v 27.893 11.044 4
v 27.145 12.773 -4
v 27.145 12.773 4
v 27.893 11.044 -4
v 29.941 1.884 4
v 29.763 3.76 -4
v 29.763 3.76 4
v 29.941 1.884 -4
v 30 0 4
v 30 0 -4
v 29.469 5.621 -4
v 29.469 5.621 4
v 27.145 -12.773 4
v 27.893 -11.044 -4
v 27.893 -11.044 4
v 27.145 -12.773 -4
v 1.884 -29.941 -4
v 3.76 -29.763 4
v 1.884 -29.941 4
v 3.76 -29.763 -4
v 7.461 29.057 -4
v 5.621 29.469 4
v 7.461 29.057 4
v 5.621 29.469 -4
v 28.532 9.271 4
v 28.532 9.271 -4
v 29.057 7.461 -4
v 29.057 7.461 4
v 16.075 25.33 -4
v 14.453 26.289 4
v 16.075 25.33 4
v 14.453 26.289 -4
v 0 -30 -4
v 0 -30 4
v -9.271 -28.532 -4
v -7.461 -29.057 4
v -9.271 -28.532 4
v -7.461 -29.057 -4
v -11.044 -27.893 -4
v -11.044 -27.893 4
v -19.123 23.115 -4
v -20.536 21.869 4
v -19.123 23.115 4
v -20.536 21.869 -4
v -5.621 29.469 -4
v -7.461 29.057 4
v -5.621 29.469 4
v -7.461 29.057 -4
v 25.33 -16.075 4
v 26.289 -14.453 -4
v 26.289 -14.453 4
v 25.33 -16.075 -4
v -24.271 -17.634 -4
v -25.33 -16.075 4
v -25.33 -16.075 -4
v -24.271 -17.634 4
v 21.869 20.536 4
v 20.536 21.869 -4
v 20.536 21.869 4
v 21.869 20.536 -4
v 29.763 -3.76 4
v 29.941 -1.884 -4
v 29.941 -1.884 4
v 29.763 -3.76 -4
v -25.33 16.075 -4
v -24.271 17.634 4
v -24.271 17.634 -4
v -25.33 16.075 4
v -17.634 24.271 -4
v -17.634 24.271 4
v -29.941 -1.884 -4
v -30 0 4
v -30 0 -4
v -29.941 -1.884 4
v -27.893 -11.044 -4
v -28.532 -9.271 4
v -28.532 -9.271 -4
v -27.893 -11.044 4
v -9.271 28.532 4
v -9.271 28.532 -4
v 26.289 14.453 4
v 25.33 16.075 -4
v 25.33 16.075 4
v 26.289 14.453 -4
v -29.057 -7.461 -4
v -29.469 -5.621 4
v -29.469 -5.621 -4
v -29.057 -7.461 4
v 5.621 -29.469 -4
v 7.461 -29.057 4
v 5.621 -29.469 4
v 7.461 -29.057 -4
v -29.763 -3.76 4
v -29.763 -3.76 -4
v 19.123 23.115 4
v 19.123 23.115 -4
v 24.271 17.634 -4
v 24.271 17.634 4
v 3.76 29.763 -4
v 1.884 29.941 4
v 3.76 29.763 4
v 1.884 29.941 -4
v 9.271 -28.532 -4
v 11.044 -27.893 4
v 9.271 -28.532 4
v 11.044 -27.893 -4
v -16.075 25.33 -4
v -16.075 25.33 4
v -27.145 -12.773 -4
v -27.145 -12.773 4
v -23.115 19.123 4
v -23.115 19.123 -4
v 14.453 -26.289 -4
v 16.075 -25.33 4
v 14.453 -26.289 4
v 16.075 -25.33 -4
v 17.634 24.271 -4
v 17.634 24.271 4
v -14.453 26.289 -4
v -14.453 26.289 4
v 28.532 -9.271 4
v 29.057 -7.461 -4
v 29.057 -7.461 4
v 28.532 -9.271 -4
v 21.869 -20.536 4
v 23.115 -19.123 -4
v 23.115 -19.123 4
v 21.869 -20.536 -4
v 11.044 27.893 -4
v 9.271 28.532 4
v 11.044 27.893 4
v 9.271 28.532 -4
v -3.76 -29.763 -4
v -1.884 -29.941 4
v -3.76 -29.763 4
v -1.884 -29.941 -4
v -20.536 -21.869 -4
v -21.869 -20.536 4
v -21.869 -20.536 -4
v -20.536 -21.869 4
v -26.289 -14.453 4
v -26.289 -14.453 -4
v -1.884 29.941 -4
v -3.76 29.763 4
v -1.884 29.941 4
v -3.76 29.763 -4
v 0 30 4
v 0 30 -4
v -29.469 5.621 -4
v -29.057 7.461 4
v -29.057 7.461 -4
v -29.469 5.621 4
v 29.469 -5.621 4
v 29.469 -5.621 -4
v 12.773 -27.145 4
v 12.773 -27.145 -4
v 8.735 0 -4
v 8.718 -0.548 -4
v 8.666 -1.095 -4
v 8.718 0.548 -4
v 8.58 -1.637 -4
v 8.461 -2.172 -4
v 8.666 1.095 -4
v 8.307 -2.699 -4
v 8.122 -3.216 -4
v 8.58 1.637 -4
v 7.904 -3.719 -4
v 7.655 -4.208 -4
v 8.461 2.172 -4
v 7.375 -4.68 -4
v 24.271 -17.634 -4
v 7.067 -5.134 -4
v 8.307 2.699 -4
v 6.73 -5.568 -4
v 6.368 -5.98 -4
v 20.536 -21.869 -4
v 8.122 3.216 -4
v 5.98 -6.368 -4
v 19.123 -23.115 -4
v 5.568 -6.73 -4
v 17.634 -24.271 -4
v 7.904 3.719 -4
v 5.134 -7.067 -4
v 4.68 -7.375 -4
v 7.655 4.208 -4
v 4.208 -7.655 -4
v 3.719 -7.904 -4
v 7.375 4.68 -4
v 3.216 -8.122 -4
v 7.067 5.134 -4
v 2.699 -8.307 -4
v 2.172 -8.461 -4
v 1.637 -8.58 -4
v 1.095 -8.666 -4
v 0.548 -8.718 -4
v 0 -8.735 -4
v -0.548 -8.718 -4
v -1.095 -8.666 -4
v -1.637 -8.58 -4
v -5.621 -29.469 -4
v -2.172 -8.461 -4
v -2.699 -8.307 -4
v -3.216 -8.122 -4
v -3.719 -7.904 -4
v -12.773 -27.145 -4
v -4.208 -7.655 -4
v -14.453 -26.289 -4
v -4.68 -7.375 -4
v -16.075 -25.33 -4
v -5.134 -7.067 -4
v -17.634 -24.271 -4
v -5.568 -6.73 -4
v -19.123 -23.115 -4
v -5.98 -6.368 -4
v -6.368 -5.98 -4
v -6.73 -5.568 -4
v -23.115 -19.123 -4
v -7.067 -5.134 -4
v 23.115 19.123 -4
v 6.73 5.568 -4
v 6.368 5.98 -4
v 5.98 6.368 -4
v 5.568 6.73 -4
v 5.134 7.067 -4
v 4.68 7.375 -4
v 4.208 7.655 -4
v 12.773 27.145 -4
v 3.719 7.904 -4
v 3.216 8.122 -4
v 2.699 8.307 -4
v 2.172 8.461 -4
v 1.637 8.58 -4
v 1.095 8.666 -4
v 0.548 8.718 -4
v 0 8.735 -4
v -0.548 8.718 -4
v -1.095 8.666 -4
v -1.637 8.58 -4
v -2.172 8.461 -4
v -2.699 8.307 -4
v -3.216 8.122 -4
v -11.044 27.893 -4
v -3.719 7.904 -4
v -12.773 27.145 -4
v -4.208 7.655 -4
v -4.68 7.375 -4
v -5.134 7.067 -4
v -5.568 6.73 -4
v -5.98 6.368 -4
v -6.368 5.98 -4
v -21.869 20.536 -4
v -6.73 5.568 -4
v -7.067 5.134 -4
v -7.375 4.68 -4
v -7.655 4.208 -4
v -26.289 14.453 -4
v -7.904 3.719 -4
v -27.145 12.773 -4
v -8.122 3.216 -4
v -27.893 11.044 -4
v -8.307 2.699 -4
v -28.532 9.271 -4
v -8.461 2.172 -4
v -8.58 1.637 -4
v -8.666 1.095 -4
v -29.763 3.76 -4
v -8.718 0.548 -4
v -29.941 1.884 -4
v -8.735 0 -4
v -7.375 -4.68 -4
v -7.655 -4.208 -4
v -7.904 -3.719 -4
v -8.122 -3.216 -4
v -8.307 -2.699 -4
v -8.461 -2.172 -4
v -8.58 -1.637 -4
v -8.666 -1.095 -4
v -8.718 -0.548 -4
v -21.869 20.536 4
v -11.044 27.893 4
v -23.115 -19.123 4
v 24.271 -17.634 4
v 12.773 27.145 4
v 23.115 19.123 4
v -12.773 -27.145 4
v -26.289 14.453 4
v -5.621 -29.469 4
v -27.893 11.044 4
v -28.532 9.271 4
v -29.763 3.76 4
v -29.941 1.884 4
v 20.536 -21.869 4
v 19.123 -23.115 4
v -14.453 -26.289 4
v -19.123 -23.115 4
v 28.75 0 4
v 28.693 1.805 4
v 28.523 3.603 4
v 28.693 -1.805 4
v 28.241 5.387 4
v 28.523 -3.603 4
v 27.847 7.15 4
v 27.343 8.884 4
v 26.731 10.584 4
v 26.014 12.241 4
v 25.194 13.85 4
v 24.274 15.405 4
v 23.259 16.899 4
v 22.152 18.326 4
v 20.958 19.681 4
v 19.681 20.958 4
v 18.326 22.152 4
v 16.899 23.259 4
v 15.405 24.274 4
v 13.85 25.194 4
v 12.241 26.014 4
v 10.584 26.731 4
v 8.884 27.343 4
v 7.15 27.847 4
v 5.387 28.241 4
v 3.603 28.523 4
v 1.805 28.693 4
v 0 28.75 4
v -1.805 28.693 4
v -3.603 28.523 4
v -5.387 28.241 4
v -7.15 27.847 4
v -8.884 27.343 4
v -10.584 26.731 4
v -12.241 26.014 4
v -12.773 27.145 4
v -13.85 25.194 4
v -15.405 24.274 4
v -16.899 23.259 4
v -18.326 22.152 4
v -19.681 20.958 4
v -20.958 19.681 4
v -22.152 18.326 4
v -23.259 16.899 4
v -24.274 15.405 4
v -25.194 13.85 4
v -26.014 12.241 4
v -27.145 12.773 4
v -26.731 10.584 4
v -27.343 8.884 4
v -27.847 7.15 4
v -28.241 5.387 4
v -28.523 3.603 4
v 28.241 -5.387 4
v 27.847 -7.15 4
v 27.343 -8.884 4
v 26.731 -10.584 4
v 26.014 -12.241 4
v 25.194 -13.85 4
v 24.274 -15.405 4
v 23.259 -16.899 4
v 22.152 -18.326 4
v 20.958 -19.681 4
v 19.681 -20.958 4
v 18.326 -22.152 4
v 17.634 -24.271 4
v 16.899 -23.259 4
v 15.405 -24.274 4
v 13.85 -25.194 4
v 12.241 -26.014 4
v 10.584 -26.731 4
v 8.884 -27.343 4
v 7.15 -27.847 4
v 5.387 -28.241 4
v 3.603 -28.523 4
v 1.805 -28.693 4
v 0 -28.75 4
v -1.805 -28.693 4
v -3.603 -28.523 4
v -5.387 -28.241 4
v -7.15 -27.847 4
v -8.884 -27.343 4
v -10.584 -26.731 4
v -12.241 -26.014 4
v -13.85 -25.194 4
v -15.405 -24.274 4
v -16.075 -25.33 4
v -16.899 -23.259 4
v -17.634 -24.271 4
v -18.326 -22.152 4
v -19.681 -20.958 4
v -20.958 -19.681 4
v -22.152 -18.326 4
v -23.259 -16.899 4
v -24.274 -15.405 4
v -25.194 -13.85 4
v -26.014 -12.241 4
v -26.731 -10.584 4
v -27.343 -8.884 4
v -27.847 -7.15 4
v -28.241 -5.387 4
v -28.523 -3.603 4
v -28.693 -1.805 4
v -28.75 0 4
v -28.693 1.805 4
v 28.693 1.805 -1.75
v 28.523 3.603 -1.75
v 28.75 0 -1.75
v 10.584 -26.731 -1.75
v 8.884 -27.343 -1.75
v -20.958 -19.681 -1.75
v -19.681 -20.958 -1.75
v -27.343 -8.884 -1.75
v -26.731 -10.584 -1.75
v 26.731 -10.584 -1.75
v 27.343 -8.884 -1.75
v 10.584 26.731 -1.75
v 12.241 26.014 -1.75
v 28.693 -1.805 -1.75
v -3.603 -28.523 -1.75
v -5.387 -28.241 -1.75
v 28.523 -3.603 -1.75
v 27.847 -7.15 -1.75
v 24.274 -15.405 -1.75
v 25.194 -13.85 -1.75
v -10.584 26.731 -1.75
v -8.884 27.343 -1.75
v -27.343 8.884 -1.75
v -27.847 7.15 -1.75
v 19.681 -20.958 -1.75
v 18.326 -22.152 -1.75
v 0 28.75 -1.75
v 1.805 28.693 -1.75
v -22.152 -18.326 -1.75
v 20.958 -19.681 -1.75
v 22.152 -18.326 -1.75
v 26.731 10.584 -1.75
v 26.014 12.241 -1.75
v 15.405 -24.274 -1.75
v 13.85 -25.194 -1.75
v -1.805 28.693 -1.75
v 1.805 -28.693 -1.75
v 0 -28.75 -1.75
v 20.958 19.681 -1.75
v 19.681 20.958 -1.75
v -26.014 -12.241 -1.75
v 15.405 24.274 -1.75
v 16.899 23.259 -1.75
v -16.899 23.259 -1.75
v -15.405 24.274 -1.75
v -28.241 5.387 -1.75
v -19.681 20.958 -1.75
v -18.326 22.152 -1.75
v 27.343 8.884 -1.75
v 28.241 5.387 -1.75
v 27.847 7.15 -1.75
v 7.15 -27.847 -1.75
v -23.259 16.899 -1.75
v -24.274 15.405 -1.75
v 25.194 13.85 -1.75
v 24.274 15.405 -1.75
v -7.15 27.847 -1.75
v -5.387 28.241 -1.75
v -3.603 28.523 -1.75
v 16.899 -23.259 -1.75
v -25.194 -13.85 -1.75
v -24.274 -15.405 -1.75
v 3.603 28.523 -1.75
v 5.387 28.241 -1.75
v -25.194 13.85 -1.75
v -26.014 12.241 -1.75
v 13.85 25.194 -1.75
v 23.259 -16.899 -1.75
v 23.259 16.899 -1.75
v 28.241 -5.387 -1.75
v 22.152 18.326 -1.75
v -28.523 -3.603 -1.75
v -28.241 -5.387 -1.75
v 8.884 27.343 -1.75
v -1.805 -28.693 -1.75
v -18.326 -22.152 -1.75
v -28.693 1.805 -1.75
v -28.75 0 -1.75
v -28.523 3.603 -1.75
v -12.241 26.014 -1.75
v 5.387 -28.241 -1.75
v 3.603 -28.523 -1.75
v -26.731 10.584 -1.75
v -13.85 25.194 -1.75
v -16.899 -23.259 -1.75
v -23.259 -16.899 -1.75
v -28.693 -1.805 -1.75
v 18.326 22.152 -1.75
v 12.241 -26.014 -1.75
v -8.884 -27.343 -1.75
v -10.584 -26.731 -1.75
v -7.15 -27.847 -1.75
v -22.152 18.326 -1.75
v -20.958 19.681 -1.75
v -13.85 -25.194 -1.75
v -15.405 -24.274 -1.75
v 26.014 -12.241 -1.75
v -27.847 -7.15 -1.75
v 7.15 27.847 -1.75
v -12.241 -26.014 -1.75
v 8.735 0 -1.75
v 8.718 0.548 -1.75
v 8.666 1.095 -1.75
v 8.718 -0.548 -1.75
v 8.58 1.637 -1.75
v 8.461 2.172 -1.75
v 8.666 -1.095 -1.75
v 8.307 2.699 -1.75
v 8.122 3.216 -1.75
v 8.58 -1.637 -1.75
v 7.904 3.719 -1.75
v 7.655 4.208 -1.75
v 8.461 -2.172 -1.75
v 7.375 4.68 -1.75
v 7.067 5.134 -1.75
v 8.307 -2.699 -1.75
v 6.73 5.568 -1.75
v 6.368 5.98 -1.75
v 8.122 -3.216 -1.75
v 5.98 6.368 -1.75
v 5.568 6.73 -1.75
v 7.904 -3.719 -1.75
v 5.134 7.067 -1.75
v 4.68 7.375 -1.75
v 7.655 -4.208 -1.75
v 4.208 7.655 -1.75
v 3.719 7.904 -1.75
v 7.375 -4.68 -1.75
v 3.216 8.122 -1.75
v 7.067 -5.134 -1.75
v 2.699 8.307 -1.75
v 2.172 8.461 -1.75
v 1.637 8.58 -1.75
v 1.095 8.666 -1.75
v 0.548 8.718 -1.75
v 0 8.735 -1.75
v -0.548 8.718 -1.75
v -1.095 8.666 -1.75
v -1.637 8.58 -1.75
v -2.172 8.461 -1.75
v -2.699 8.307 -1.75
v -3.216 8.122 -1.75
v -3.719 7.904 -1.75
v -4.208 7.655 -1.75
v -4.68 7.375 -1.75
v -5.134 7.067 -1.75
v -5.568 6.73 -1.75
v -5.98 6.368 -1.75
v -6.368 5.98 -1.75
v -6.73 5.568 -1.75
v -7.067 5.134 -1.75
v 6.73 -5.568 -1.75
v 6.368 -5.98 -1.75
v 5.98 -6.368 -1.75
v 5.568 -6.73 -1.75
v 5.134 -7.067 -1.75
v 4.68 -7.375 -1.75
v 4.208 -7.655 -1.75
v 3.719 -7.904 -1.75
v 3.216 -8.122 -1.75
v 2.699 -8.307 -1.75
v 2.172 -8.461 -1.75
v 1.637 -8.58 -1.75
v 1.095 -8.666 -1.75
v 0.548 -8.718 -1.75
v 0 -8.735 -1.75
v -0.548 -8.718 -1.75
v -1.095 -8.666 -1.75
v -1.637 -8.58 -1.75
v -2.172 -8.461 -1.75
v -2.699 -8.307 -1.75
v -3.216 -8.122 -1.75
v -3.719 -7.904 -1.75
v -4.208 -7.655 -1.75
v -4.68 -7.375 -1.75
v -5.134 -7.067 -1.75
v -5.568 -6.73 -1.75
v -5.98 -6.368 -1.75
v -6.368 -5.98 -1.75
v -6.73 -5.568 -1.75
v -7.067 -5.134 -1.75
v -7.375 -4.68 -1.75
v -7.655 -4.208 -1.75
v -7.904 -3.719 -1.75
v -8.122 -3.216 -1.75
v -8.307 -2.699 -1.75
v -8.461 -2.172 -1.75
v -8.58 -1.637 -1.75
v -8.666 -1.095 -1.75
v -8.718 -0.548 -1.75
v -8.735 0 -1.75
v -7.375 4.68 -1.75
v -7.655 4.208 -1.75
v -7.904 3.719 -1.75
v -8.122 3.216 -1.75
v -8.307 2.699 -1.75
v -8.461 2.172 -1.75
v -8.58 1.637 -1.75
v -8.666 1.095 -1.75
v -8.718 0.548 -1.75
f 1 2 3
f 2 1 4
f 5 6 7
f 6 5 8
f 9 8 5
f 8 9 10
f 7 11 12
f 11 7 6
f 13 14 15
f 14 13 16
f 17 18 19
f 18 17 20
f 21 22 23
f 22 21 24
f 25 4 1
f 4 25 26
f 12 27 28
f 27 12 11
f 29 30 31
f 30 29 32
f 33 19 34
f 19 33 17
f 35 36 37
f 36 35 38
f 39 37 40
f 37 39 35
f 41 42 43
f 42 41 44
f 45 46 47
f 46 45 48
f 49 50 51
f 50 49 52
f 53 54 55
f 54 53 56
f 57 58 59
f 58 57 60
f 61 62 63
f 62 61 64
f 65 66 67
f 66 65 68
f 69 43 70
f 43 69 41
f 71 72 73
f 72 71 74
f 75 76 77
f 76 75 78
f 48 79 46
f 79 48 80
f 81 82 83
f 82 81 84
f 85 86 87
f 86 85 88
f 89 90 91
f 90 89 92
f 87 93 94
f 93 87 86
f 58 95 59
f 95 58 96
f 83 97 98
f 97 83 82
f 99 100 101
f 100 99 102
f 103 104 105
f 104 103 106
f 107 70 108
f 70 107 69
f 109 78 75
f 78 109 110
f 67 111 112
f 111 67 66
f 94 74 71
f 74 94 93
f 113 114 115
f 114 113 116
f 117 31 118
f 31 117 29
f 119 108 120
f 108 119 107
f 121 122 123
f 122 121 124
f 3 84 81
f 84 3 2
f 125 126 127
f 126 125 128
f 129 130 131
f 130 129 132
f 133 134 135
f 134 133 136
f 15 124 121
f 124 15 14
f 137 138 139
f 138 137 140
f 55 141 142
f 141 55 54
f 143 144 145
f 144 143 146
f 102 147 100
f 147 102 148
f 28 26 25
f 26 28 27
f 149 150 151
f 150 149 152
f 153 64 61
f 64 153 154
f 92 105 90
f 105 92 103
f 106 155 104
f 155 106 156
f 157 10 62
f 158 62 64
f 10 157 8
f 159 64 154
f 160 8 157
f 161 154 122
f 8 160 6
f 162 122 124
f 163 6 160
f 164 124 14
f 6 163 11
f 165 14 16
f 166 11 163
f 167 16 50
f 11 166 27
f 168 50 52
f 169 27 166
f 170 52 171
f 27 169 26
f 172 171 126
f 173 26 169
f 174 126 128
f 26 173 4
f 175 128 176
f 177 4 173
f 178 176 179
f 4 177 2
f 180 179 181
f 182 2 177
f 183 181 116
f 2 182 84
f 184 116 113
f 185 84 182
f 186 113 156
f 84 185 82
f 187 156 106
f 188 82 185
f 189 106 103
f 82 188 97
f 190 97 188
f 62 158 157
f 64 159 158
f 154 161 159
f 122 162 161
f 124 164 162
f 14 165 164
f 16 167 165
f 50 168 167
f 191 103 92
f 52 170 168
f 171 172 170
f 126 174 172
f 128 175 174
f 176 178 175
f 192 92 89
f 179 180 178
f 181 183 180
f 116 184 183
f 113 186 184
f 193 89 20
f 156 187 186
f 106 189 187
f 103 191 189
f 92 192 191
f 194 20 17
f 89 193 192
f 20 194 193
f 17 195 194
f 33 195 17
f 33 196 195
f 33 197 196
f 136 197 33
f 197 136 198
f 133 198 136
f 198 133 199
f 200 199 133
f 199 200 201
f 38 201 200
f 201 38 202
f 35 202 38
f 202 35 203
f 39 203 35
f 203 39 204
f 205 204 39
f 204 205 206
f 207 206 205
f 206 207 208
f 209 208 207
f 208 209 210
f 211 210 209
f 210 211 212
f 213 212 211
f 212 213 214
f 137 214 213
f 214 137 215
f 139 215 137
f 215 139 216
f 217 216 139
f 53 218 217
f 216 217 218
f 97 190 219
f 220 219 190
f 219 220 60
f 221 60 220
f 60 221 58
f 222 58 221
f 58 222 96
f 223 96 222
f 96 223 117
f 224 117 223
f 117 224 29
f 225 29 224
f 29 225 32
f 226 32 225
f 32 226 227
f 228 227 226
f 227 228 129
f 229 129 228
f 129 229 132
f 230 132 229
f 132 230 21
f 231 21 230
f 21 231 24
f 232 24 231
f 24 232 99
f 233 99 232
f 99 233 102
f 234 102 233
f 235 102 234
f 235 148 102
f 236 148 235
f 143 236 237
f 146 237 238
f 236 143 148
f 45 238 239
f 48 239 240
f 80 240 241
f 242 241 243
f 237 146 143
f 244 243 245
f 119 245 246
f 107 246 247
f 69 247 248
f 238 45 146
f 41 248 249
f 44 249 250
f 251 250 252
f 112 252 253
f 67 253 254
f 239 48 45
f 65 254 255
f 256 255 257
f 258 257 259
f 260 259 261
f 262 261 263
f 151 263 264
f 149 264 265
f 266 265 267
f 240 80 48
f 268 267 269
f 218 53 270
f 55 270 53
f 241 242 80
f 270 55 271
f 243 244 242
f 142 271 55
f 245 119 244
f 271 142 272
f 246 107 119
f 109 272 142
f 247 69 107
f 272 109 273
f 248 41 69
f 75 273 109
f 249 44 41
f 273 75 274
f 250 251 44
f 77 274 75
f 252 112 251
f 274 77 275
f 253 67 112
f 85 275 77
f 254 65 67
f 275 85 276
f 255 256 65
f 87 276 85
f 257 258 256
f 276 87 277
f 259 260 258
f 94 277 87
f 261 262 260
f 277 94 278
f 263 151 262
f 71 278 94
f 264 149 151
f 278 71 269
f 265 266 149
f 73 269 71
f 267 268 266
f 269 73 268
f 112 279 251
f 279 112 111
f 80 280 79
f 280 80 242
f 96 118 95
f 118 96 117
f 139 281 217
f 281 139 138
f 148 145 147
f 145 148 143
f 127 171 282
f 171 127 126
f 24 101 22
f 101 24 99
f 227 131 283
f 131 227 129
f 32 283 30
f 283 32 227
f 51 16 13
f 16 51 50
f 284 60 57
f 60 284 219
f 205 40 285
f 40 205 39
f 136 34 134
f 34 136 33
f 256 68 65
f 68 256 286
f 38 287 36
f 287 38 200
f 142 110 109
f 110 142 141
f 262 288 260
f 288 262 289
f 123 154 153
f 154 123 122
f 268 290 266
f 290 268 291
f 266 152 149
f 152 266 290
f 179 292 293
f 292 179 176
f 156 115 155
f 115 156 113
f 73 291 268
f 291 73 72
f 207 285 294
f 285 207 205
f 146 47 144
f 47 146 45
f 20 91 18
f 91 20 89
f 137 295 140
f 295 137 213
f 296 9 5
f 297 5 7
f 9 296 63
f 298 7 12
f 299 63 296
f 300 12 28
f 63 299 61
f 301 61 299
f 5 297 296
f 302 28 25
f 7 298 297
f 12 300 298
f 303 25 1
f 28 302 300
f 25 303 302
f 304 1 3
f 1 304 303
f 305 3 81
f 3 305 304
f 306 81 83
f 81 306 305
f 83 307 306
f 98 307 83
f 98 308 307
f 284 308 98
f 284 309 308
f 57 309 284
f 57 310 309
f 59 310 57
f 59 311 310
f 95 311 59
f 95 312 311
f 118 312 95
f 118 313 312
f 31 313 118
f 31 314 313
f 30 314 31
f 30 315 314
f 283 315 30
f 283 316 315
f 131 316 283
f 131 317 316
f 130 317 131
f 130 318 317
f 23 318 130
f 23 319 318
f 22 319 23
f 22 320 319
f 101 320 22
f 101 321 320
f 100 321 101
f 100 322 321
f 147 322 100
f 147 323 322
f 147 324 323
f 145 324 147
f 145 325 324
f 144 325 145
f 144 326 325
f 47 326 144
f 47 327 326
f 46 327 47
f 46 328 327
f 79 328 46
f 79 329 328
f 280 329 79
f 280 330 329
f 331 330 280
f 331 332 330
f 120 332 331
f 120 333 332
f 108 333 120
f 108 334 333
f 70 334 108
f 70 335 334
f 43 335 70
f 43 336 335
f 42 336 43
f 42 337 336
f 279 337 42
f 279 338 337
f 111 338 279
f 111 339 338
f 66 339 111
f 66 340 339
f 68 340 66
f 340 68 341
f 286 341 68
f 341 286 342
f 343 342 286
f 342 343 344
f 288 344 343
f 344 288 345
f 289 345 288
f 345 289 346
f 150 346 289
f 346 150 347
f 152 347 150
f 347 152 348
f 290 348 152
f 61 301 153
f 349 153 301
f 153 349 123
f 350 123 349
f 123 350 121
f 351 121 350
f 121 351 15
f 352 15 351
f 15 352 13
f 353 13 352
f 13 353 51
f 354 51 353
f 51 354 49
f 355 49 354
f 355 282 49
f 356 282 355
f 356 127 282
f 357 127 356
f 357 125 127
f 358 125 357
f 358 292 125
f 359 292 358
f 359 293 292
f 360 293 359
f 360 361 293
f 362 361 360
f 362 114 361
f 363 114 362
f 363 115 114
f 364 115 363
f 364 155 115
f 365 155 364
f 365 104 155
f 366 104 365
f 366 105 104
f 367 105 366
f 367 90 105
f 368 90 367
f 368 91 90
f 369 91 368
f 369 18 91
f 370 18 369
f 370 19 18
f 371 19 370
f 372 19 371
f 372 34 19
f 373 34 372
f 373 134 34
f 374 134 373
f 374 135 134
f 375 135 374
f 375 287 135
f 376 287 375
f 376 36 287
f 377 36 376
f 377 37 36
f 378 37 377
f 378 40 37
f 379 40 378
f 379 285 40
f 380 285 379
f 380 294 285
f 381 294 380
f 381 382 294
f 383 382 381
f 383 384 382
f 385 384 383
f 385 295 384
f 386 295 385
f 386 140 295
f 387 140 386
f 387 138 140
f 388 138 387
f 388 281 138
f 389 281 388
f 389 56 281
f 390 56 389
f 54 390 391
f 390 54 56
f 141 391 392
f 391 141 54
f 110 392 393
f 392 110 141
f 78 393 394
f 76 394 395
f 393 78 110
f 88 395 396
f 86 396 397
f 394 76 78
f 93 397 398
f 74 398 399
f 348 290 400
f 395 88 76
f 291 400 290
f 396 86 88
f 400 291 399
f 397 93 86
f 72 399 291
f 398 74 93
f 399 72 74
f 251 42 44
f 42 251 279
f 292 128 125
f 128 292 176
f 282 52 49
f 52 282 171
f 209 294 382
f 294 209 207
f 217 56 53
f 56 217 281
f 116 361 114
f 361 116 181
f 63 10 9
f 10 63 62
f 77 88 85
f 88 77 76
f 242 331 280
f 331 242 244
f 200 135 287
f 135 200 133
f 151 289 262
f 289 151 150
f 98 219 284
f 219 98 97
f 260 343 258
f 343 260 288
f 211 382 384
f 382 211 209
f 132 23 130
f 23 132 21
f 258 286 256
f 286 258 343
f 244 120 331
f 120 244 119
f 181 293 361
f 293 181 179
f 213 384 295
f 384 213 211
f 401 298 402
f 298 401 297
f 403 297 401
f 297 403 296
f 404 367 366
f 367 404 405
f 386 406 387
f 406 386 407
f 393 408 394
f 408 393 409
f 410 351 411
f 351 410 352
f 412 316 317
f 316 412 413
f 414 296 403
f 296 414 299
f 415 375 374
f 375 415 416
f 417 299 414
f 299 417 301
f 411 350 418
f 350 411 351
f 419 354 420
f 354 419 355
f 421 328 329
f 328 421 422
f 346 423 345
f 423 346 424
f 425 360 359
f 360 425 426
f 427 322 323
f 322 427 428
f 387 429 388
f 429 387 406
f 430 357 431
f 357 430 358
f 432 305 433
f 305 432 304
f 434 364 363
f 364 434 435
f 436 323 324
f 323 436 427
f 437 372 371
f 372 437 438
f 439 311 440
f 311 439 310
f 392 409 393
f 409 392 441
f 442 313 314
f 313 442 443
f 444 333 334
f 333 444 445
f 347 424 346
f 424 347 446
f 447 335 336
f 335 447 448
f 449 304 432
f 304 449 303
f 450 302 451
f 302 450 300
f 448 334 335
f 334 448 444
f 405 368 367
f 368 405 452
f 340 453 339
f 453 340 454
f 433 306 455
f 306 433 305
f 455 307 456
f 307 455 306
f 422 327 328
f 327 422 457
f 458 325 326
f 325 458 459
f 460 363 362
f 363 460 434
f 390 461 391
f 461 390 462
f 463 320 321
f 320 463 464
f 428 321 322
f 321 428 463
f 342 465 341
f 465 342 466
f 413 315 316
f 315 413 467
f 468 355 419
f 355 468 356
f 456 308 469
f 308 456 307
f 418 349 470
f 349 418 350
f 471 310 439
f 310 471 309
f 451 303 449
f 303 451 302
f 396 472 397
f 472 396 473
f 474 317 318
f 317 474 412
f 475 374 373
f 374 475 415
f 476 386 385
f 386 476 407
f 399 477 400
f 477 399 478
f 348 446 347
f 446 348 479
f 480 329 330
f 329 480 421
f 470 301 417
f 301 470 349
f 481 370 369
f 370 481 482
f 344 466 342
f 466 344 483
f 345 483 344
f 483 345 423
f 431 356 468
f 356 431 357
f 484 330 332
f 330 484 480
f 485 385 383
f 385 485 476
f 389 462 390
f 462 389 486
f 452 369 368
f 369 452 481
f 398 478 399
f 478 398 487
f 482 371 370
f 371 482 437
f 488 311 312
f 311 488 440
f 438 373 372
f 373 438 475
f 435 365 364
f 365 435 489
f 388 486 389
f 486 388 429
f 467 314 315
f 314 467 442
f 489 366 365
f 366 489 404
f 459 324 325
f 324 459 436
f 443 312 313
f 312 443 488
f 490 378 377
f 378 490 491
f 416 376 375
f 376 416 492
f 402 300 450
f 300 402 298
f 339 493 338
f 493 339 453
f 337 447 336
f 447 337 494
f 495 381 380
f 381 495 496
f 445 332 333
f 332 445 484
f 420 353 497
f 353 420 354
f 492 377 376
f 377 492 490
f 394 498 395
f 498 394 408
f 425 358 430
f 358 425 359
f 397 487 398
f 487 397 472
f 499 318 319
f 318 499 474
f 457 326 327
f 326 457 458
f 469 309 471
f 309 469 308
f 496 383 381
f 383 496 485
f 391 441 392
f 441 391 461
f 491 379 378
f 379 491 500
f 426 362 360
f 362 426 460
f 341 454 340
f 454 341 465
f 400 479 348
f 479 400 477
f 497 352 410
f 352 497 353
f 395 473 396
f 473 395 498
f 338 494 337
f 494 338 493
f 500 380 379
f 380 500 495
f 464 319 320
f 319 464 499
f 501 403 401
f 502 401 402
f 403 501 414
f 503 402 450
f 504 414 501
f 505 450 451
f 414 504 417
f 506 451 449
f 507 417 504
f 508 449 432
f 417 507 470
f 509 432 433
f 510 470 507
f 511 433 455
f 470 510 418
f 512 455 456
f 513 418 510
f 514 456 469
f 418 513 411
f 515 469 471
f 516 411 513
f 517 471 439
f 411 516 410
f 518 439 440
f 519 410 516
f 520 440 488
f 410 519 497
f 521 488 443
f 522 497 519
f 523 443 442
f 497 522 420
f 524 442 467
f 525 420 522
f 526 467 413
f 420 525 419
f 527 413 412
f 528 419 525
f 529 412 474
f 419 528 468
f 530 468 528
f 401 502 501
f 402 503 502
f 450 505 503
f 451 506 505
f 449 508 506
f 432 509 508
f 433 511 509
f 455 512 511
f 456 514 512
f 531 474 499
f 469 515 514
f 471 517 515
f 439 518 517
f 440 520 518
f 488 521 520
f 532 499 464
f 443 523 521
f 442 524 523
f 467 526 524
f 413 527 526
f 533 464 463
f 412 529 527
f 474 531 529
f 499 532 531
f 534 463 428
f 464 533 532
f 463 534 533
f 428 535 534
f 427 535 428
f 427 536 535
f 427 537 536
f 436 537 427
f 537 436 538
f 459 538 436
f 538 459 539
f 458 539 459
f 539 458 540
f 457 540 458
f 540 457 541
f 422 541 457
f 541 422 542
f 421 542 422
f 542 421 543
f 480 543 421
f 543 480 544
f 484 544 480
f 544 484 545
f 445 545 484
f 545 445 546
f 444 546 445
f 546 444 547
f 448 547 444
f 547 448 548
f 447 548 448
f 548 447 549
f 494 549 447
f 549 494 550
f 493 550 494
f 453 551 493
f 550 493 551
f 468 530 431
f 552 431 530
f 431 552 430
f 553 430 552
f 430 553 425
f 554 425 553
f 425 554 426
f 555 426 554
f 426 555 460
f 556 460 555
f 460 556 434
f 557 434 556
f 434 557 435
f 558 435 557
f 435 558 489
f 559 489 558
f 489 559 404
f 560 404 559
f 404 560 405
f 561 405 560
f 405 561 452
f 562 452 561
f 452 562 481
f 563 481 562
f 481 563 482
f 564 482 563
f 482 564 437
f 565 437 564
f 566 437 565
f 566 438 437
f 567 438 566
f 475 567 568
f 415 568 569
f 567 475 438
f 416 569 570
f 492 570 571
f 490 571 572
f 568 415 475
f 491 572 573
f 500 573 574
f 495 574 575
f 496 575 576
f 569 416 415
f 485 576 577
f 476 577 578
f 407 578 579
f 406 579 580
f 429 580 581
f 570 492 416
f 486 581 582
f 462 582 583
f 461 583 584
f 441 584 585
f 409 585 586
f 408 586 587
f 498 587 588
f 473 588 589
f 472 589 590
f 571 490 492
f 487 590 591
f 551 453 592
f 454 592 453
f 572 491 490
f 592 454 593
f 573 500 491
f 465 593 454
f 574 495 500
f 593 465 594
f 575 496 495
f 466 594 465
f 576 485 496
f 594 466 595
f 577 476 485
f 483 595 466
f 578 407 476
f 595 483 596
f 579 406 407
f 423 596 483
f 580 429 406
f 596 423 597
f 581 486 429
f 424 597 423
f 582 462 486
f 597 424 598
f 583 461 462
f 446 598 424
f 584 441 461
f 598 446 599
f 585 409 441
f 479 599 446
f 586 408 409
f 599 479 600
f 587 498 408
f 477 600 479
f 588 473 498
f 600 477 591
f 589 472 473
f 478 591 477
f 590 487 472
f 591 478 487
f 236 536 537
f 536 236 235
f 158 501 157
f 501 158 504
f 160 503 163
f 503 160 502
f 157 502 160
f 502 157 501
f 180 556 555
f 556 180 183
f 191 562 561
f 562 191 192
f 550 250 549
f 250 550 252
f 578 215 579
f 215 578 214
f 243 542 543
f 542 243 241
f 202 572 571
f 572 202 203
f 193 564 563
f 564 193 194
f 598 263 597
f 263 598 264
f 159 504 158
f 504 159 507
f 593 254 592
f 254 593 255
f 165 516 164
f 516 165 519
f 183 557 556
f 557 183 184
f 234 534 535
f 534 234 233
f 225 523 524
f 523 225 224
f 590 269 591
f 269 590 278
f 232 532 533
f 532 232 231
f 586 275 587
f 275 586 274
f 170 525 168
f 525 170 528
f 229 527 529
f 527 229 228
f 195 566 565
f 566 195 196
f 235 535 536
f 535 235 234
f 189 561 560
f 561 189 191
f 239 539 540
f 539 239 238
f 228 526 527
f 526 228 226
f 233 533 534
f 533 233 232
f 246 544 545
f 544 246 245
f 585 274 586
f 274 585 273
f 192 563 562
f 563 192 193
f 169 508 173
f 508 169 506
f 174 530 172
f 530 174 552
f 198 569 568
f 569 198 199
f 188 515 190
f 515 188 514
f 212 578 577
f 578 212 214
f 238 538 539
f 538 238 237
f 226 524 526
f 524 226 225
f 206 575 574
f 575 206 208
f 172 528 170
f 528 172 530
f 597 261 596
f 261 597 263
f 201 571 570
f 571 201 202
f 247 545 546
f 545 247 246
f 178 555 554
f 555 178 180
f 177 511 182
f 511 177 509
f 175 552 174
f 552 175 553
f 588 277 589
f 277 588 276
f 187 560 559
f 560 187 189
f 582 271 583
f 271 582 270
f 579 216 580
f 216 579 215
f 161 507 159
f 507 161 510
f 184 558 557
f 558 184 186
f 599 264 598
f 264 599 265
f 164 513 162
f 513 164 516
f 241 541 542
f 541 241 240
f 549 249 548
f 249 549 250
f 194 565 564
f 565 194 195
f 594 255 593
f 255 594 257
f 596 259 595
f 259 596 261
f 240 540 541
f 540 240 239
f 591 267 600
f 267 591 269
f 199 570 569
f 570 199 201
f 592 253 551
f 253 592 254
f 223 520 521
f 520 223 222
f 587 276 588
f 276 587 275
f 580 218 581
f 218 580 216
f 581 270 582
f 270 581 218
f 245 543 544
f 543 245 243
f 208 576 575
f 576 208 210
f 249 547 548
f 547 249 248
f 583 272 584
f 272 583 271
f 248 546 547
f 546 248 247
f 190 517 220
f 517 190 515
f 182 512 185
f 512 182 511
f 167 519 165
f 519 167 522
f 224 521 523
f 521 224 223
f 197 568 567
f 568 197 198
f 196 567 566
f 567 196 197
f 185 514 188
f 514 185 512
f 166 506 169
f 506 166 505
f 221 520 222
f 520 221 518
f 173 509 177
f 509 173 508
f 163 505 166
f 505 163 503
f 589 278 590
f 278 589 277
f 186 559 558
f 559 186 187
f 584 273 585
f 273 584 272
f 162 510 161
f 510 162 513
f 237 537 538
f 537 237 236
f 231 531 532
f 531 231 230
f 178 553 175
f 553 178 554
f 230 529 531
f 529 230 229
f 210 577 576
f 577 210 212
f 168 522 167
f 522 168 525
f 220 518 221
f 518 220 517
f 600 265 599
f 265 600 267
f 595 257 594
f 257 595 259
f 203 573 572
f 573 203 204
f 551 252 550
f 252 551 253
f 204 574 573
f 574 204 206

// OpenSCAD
// This is a powder spill tray.
//
// Warning -- some sanding and fitting may be required.
//
// This is licensed under the creative commons+attribution license
//
// To fulfil the attribution requirement, please link to:
// http://www.thingiverse.com/thing:2207724

/* [Main] */

// Define number of facets (large numbers provide better smoothing)
$fn=100;

// Define height of the cylinder wall in mm
height=8.0;

// Define outside diameter of cylinder in mm
outside_diameter=60.0;

// Define wall thickness in mm
thickness=2.5;

// Define diameter of hole in mm
hole_diameter=17.47;

difference()
{
	// Make outer shape
	translate([0,0,0])              cylinder(h=height,r=outside_diameter/2,center=true);
	// Make inner shape
	translate([0,0,thickness/2]) cylinder(h=height-thickness+.5,r=(outside_diameter-thickness)/2,center=true);
	// Drill hole
	translate([0,0,thickness])    cylinder(h=2*height,r=hole_diameter/2,center=true);
}
